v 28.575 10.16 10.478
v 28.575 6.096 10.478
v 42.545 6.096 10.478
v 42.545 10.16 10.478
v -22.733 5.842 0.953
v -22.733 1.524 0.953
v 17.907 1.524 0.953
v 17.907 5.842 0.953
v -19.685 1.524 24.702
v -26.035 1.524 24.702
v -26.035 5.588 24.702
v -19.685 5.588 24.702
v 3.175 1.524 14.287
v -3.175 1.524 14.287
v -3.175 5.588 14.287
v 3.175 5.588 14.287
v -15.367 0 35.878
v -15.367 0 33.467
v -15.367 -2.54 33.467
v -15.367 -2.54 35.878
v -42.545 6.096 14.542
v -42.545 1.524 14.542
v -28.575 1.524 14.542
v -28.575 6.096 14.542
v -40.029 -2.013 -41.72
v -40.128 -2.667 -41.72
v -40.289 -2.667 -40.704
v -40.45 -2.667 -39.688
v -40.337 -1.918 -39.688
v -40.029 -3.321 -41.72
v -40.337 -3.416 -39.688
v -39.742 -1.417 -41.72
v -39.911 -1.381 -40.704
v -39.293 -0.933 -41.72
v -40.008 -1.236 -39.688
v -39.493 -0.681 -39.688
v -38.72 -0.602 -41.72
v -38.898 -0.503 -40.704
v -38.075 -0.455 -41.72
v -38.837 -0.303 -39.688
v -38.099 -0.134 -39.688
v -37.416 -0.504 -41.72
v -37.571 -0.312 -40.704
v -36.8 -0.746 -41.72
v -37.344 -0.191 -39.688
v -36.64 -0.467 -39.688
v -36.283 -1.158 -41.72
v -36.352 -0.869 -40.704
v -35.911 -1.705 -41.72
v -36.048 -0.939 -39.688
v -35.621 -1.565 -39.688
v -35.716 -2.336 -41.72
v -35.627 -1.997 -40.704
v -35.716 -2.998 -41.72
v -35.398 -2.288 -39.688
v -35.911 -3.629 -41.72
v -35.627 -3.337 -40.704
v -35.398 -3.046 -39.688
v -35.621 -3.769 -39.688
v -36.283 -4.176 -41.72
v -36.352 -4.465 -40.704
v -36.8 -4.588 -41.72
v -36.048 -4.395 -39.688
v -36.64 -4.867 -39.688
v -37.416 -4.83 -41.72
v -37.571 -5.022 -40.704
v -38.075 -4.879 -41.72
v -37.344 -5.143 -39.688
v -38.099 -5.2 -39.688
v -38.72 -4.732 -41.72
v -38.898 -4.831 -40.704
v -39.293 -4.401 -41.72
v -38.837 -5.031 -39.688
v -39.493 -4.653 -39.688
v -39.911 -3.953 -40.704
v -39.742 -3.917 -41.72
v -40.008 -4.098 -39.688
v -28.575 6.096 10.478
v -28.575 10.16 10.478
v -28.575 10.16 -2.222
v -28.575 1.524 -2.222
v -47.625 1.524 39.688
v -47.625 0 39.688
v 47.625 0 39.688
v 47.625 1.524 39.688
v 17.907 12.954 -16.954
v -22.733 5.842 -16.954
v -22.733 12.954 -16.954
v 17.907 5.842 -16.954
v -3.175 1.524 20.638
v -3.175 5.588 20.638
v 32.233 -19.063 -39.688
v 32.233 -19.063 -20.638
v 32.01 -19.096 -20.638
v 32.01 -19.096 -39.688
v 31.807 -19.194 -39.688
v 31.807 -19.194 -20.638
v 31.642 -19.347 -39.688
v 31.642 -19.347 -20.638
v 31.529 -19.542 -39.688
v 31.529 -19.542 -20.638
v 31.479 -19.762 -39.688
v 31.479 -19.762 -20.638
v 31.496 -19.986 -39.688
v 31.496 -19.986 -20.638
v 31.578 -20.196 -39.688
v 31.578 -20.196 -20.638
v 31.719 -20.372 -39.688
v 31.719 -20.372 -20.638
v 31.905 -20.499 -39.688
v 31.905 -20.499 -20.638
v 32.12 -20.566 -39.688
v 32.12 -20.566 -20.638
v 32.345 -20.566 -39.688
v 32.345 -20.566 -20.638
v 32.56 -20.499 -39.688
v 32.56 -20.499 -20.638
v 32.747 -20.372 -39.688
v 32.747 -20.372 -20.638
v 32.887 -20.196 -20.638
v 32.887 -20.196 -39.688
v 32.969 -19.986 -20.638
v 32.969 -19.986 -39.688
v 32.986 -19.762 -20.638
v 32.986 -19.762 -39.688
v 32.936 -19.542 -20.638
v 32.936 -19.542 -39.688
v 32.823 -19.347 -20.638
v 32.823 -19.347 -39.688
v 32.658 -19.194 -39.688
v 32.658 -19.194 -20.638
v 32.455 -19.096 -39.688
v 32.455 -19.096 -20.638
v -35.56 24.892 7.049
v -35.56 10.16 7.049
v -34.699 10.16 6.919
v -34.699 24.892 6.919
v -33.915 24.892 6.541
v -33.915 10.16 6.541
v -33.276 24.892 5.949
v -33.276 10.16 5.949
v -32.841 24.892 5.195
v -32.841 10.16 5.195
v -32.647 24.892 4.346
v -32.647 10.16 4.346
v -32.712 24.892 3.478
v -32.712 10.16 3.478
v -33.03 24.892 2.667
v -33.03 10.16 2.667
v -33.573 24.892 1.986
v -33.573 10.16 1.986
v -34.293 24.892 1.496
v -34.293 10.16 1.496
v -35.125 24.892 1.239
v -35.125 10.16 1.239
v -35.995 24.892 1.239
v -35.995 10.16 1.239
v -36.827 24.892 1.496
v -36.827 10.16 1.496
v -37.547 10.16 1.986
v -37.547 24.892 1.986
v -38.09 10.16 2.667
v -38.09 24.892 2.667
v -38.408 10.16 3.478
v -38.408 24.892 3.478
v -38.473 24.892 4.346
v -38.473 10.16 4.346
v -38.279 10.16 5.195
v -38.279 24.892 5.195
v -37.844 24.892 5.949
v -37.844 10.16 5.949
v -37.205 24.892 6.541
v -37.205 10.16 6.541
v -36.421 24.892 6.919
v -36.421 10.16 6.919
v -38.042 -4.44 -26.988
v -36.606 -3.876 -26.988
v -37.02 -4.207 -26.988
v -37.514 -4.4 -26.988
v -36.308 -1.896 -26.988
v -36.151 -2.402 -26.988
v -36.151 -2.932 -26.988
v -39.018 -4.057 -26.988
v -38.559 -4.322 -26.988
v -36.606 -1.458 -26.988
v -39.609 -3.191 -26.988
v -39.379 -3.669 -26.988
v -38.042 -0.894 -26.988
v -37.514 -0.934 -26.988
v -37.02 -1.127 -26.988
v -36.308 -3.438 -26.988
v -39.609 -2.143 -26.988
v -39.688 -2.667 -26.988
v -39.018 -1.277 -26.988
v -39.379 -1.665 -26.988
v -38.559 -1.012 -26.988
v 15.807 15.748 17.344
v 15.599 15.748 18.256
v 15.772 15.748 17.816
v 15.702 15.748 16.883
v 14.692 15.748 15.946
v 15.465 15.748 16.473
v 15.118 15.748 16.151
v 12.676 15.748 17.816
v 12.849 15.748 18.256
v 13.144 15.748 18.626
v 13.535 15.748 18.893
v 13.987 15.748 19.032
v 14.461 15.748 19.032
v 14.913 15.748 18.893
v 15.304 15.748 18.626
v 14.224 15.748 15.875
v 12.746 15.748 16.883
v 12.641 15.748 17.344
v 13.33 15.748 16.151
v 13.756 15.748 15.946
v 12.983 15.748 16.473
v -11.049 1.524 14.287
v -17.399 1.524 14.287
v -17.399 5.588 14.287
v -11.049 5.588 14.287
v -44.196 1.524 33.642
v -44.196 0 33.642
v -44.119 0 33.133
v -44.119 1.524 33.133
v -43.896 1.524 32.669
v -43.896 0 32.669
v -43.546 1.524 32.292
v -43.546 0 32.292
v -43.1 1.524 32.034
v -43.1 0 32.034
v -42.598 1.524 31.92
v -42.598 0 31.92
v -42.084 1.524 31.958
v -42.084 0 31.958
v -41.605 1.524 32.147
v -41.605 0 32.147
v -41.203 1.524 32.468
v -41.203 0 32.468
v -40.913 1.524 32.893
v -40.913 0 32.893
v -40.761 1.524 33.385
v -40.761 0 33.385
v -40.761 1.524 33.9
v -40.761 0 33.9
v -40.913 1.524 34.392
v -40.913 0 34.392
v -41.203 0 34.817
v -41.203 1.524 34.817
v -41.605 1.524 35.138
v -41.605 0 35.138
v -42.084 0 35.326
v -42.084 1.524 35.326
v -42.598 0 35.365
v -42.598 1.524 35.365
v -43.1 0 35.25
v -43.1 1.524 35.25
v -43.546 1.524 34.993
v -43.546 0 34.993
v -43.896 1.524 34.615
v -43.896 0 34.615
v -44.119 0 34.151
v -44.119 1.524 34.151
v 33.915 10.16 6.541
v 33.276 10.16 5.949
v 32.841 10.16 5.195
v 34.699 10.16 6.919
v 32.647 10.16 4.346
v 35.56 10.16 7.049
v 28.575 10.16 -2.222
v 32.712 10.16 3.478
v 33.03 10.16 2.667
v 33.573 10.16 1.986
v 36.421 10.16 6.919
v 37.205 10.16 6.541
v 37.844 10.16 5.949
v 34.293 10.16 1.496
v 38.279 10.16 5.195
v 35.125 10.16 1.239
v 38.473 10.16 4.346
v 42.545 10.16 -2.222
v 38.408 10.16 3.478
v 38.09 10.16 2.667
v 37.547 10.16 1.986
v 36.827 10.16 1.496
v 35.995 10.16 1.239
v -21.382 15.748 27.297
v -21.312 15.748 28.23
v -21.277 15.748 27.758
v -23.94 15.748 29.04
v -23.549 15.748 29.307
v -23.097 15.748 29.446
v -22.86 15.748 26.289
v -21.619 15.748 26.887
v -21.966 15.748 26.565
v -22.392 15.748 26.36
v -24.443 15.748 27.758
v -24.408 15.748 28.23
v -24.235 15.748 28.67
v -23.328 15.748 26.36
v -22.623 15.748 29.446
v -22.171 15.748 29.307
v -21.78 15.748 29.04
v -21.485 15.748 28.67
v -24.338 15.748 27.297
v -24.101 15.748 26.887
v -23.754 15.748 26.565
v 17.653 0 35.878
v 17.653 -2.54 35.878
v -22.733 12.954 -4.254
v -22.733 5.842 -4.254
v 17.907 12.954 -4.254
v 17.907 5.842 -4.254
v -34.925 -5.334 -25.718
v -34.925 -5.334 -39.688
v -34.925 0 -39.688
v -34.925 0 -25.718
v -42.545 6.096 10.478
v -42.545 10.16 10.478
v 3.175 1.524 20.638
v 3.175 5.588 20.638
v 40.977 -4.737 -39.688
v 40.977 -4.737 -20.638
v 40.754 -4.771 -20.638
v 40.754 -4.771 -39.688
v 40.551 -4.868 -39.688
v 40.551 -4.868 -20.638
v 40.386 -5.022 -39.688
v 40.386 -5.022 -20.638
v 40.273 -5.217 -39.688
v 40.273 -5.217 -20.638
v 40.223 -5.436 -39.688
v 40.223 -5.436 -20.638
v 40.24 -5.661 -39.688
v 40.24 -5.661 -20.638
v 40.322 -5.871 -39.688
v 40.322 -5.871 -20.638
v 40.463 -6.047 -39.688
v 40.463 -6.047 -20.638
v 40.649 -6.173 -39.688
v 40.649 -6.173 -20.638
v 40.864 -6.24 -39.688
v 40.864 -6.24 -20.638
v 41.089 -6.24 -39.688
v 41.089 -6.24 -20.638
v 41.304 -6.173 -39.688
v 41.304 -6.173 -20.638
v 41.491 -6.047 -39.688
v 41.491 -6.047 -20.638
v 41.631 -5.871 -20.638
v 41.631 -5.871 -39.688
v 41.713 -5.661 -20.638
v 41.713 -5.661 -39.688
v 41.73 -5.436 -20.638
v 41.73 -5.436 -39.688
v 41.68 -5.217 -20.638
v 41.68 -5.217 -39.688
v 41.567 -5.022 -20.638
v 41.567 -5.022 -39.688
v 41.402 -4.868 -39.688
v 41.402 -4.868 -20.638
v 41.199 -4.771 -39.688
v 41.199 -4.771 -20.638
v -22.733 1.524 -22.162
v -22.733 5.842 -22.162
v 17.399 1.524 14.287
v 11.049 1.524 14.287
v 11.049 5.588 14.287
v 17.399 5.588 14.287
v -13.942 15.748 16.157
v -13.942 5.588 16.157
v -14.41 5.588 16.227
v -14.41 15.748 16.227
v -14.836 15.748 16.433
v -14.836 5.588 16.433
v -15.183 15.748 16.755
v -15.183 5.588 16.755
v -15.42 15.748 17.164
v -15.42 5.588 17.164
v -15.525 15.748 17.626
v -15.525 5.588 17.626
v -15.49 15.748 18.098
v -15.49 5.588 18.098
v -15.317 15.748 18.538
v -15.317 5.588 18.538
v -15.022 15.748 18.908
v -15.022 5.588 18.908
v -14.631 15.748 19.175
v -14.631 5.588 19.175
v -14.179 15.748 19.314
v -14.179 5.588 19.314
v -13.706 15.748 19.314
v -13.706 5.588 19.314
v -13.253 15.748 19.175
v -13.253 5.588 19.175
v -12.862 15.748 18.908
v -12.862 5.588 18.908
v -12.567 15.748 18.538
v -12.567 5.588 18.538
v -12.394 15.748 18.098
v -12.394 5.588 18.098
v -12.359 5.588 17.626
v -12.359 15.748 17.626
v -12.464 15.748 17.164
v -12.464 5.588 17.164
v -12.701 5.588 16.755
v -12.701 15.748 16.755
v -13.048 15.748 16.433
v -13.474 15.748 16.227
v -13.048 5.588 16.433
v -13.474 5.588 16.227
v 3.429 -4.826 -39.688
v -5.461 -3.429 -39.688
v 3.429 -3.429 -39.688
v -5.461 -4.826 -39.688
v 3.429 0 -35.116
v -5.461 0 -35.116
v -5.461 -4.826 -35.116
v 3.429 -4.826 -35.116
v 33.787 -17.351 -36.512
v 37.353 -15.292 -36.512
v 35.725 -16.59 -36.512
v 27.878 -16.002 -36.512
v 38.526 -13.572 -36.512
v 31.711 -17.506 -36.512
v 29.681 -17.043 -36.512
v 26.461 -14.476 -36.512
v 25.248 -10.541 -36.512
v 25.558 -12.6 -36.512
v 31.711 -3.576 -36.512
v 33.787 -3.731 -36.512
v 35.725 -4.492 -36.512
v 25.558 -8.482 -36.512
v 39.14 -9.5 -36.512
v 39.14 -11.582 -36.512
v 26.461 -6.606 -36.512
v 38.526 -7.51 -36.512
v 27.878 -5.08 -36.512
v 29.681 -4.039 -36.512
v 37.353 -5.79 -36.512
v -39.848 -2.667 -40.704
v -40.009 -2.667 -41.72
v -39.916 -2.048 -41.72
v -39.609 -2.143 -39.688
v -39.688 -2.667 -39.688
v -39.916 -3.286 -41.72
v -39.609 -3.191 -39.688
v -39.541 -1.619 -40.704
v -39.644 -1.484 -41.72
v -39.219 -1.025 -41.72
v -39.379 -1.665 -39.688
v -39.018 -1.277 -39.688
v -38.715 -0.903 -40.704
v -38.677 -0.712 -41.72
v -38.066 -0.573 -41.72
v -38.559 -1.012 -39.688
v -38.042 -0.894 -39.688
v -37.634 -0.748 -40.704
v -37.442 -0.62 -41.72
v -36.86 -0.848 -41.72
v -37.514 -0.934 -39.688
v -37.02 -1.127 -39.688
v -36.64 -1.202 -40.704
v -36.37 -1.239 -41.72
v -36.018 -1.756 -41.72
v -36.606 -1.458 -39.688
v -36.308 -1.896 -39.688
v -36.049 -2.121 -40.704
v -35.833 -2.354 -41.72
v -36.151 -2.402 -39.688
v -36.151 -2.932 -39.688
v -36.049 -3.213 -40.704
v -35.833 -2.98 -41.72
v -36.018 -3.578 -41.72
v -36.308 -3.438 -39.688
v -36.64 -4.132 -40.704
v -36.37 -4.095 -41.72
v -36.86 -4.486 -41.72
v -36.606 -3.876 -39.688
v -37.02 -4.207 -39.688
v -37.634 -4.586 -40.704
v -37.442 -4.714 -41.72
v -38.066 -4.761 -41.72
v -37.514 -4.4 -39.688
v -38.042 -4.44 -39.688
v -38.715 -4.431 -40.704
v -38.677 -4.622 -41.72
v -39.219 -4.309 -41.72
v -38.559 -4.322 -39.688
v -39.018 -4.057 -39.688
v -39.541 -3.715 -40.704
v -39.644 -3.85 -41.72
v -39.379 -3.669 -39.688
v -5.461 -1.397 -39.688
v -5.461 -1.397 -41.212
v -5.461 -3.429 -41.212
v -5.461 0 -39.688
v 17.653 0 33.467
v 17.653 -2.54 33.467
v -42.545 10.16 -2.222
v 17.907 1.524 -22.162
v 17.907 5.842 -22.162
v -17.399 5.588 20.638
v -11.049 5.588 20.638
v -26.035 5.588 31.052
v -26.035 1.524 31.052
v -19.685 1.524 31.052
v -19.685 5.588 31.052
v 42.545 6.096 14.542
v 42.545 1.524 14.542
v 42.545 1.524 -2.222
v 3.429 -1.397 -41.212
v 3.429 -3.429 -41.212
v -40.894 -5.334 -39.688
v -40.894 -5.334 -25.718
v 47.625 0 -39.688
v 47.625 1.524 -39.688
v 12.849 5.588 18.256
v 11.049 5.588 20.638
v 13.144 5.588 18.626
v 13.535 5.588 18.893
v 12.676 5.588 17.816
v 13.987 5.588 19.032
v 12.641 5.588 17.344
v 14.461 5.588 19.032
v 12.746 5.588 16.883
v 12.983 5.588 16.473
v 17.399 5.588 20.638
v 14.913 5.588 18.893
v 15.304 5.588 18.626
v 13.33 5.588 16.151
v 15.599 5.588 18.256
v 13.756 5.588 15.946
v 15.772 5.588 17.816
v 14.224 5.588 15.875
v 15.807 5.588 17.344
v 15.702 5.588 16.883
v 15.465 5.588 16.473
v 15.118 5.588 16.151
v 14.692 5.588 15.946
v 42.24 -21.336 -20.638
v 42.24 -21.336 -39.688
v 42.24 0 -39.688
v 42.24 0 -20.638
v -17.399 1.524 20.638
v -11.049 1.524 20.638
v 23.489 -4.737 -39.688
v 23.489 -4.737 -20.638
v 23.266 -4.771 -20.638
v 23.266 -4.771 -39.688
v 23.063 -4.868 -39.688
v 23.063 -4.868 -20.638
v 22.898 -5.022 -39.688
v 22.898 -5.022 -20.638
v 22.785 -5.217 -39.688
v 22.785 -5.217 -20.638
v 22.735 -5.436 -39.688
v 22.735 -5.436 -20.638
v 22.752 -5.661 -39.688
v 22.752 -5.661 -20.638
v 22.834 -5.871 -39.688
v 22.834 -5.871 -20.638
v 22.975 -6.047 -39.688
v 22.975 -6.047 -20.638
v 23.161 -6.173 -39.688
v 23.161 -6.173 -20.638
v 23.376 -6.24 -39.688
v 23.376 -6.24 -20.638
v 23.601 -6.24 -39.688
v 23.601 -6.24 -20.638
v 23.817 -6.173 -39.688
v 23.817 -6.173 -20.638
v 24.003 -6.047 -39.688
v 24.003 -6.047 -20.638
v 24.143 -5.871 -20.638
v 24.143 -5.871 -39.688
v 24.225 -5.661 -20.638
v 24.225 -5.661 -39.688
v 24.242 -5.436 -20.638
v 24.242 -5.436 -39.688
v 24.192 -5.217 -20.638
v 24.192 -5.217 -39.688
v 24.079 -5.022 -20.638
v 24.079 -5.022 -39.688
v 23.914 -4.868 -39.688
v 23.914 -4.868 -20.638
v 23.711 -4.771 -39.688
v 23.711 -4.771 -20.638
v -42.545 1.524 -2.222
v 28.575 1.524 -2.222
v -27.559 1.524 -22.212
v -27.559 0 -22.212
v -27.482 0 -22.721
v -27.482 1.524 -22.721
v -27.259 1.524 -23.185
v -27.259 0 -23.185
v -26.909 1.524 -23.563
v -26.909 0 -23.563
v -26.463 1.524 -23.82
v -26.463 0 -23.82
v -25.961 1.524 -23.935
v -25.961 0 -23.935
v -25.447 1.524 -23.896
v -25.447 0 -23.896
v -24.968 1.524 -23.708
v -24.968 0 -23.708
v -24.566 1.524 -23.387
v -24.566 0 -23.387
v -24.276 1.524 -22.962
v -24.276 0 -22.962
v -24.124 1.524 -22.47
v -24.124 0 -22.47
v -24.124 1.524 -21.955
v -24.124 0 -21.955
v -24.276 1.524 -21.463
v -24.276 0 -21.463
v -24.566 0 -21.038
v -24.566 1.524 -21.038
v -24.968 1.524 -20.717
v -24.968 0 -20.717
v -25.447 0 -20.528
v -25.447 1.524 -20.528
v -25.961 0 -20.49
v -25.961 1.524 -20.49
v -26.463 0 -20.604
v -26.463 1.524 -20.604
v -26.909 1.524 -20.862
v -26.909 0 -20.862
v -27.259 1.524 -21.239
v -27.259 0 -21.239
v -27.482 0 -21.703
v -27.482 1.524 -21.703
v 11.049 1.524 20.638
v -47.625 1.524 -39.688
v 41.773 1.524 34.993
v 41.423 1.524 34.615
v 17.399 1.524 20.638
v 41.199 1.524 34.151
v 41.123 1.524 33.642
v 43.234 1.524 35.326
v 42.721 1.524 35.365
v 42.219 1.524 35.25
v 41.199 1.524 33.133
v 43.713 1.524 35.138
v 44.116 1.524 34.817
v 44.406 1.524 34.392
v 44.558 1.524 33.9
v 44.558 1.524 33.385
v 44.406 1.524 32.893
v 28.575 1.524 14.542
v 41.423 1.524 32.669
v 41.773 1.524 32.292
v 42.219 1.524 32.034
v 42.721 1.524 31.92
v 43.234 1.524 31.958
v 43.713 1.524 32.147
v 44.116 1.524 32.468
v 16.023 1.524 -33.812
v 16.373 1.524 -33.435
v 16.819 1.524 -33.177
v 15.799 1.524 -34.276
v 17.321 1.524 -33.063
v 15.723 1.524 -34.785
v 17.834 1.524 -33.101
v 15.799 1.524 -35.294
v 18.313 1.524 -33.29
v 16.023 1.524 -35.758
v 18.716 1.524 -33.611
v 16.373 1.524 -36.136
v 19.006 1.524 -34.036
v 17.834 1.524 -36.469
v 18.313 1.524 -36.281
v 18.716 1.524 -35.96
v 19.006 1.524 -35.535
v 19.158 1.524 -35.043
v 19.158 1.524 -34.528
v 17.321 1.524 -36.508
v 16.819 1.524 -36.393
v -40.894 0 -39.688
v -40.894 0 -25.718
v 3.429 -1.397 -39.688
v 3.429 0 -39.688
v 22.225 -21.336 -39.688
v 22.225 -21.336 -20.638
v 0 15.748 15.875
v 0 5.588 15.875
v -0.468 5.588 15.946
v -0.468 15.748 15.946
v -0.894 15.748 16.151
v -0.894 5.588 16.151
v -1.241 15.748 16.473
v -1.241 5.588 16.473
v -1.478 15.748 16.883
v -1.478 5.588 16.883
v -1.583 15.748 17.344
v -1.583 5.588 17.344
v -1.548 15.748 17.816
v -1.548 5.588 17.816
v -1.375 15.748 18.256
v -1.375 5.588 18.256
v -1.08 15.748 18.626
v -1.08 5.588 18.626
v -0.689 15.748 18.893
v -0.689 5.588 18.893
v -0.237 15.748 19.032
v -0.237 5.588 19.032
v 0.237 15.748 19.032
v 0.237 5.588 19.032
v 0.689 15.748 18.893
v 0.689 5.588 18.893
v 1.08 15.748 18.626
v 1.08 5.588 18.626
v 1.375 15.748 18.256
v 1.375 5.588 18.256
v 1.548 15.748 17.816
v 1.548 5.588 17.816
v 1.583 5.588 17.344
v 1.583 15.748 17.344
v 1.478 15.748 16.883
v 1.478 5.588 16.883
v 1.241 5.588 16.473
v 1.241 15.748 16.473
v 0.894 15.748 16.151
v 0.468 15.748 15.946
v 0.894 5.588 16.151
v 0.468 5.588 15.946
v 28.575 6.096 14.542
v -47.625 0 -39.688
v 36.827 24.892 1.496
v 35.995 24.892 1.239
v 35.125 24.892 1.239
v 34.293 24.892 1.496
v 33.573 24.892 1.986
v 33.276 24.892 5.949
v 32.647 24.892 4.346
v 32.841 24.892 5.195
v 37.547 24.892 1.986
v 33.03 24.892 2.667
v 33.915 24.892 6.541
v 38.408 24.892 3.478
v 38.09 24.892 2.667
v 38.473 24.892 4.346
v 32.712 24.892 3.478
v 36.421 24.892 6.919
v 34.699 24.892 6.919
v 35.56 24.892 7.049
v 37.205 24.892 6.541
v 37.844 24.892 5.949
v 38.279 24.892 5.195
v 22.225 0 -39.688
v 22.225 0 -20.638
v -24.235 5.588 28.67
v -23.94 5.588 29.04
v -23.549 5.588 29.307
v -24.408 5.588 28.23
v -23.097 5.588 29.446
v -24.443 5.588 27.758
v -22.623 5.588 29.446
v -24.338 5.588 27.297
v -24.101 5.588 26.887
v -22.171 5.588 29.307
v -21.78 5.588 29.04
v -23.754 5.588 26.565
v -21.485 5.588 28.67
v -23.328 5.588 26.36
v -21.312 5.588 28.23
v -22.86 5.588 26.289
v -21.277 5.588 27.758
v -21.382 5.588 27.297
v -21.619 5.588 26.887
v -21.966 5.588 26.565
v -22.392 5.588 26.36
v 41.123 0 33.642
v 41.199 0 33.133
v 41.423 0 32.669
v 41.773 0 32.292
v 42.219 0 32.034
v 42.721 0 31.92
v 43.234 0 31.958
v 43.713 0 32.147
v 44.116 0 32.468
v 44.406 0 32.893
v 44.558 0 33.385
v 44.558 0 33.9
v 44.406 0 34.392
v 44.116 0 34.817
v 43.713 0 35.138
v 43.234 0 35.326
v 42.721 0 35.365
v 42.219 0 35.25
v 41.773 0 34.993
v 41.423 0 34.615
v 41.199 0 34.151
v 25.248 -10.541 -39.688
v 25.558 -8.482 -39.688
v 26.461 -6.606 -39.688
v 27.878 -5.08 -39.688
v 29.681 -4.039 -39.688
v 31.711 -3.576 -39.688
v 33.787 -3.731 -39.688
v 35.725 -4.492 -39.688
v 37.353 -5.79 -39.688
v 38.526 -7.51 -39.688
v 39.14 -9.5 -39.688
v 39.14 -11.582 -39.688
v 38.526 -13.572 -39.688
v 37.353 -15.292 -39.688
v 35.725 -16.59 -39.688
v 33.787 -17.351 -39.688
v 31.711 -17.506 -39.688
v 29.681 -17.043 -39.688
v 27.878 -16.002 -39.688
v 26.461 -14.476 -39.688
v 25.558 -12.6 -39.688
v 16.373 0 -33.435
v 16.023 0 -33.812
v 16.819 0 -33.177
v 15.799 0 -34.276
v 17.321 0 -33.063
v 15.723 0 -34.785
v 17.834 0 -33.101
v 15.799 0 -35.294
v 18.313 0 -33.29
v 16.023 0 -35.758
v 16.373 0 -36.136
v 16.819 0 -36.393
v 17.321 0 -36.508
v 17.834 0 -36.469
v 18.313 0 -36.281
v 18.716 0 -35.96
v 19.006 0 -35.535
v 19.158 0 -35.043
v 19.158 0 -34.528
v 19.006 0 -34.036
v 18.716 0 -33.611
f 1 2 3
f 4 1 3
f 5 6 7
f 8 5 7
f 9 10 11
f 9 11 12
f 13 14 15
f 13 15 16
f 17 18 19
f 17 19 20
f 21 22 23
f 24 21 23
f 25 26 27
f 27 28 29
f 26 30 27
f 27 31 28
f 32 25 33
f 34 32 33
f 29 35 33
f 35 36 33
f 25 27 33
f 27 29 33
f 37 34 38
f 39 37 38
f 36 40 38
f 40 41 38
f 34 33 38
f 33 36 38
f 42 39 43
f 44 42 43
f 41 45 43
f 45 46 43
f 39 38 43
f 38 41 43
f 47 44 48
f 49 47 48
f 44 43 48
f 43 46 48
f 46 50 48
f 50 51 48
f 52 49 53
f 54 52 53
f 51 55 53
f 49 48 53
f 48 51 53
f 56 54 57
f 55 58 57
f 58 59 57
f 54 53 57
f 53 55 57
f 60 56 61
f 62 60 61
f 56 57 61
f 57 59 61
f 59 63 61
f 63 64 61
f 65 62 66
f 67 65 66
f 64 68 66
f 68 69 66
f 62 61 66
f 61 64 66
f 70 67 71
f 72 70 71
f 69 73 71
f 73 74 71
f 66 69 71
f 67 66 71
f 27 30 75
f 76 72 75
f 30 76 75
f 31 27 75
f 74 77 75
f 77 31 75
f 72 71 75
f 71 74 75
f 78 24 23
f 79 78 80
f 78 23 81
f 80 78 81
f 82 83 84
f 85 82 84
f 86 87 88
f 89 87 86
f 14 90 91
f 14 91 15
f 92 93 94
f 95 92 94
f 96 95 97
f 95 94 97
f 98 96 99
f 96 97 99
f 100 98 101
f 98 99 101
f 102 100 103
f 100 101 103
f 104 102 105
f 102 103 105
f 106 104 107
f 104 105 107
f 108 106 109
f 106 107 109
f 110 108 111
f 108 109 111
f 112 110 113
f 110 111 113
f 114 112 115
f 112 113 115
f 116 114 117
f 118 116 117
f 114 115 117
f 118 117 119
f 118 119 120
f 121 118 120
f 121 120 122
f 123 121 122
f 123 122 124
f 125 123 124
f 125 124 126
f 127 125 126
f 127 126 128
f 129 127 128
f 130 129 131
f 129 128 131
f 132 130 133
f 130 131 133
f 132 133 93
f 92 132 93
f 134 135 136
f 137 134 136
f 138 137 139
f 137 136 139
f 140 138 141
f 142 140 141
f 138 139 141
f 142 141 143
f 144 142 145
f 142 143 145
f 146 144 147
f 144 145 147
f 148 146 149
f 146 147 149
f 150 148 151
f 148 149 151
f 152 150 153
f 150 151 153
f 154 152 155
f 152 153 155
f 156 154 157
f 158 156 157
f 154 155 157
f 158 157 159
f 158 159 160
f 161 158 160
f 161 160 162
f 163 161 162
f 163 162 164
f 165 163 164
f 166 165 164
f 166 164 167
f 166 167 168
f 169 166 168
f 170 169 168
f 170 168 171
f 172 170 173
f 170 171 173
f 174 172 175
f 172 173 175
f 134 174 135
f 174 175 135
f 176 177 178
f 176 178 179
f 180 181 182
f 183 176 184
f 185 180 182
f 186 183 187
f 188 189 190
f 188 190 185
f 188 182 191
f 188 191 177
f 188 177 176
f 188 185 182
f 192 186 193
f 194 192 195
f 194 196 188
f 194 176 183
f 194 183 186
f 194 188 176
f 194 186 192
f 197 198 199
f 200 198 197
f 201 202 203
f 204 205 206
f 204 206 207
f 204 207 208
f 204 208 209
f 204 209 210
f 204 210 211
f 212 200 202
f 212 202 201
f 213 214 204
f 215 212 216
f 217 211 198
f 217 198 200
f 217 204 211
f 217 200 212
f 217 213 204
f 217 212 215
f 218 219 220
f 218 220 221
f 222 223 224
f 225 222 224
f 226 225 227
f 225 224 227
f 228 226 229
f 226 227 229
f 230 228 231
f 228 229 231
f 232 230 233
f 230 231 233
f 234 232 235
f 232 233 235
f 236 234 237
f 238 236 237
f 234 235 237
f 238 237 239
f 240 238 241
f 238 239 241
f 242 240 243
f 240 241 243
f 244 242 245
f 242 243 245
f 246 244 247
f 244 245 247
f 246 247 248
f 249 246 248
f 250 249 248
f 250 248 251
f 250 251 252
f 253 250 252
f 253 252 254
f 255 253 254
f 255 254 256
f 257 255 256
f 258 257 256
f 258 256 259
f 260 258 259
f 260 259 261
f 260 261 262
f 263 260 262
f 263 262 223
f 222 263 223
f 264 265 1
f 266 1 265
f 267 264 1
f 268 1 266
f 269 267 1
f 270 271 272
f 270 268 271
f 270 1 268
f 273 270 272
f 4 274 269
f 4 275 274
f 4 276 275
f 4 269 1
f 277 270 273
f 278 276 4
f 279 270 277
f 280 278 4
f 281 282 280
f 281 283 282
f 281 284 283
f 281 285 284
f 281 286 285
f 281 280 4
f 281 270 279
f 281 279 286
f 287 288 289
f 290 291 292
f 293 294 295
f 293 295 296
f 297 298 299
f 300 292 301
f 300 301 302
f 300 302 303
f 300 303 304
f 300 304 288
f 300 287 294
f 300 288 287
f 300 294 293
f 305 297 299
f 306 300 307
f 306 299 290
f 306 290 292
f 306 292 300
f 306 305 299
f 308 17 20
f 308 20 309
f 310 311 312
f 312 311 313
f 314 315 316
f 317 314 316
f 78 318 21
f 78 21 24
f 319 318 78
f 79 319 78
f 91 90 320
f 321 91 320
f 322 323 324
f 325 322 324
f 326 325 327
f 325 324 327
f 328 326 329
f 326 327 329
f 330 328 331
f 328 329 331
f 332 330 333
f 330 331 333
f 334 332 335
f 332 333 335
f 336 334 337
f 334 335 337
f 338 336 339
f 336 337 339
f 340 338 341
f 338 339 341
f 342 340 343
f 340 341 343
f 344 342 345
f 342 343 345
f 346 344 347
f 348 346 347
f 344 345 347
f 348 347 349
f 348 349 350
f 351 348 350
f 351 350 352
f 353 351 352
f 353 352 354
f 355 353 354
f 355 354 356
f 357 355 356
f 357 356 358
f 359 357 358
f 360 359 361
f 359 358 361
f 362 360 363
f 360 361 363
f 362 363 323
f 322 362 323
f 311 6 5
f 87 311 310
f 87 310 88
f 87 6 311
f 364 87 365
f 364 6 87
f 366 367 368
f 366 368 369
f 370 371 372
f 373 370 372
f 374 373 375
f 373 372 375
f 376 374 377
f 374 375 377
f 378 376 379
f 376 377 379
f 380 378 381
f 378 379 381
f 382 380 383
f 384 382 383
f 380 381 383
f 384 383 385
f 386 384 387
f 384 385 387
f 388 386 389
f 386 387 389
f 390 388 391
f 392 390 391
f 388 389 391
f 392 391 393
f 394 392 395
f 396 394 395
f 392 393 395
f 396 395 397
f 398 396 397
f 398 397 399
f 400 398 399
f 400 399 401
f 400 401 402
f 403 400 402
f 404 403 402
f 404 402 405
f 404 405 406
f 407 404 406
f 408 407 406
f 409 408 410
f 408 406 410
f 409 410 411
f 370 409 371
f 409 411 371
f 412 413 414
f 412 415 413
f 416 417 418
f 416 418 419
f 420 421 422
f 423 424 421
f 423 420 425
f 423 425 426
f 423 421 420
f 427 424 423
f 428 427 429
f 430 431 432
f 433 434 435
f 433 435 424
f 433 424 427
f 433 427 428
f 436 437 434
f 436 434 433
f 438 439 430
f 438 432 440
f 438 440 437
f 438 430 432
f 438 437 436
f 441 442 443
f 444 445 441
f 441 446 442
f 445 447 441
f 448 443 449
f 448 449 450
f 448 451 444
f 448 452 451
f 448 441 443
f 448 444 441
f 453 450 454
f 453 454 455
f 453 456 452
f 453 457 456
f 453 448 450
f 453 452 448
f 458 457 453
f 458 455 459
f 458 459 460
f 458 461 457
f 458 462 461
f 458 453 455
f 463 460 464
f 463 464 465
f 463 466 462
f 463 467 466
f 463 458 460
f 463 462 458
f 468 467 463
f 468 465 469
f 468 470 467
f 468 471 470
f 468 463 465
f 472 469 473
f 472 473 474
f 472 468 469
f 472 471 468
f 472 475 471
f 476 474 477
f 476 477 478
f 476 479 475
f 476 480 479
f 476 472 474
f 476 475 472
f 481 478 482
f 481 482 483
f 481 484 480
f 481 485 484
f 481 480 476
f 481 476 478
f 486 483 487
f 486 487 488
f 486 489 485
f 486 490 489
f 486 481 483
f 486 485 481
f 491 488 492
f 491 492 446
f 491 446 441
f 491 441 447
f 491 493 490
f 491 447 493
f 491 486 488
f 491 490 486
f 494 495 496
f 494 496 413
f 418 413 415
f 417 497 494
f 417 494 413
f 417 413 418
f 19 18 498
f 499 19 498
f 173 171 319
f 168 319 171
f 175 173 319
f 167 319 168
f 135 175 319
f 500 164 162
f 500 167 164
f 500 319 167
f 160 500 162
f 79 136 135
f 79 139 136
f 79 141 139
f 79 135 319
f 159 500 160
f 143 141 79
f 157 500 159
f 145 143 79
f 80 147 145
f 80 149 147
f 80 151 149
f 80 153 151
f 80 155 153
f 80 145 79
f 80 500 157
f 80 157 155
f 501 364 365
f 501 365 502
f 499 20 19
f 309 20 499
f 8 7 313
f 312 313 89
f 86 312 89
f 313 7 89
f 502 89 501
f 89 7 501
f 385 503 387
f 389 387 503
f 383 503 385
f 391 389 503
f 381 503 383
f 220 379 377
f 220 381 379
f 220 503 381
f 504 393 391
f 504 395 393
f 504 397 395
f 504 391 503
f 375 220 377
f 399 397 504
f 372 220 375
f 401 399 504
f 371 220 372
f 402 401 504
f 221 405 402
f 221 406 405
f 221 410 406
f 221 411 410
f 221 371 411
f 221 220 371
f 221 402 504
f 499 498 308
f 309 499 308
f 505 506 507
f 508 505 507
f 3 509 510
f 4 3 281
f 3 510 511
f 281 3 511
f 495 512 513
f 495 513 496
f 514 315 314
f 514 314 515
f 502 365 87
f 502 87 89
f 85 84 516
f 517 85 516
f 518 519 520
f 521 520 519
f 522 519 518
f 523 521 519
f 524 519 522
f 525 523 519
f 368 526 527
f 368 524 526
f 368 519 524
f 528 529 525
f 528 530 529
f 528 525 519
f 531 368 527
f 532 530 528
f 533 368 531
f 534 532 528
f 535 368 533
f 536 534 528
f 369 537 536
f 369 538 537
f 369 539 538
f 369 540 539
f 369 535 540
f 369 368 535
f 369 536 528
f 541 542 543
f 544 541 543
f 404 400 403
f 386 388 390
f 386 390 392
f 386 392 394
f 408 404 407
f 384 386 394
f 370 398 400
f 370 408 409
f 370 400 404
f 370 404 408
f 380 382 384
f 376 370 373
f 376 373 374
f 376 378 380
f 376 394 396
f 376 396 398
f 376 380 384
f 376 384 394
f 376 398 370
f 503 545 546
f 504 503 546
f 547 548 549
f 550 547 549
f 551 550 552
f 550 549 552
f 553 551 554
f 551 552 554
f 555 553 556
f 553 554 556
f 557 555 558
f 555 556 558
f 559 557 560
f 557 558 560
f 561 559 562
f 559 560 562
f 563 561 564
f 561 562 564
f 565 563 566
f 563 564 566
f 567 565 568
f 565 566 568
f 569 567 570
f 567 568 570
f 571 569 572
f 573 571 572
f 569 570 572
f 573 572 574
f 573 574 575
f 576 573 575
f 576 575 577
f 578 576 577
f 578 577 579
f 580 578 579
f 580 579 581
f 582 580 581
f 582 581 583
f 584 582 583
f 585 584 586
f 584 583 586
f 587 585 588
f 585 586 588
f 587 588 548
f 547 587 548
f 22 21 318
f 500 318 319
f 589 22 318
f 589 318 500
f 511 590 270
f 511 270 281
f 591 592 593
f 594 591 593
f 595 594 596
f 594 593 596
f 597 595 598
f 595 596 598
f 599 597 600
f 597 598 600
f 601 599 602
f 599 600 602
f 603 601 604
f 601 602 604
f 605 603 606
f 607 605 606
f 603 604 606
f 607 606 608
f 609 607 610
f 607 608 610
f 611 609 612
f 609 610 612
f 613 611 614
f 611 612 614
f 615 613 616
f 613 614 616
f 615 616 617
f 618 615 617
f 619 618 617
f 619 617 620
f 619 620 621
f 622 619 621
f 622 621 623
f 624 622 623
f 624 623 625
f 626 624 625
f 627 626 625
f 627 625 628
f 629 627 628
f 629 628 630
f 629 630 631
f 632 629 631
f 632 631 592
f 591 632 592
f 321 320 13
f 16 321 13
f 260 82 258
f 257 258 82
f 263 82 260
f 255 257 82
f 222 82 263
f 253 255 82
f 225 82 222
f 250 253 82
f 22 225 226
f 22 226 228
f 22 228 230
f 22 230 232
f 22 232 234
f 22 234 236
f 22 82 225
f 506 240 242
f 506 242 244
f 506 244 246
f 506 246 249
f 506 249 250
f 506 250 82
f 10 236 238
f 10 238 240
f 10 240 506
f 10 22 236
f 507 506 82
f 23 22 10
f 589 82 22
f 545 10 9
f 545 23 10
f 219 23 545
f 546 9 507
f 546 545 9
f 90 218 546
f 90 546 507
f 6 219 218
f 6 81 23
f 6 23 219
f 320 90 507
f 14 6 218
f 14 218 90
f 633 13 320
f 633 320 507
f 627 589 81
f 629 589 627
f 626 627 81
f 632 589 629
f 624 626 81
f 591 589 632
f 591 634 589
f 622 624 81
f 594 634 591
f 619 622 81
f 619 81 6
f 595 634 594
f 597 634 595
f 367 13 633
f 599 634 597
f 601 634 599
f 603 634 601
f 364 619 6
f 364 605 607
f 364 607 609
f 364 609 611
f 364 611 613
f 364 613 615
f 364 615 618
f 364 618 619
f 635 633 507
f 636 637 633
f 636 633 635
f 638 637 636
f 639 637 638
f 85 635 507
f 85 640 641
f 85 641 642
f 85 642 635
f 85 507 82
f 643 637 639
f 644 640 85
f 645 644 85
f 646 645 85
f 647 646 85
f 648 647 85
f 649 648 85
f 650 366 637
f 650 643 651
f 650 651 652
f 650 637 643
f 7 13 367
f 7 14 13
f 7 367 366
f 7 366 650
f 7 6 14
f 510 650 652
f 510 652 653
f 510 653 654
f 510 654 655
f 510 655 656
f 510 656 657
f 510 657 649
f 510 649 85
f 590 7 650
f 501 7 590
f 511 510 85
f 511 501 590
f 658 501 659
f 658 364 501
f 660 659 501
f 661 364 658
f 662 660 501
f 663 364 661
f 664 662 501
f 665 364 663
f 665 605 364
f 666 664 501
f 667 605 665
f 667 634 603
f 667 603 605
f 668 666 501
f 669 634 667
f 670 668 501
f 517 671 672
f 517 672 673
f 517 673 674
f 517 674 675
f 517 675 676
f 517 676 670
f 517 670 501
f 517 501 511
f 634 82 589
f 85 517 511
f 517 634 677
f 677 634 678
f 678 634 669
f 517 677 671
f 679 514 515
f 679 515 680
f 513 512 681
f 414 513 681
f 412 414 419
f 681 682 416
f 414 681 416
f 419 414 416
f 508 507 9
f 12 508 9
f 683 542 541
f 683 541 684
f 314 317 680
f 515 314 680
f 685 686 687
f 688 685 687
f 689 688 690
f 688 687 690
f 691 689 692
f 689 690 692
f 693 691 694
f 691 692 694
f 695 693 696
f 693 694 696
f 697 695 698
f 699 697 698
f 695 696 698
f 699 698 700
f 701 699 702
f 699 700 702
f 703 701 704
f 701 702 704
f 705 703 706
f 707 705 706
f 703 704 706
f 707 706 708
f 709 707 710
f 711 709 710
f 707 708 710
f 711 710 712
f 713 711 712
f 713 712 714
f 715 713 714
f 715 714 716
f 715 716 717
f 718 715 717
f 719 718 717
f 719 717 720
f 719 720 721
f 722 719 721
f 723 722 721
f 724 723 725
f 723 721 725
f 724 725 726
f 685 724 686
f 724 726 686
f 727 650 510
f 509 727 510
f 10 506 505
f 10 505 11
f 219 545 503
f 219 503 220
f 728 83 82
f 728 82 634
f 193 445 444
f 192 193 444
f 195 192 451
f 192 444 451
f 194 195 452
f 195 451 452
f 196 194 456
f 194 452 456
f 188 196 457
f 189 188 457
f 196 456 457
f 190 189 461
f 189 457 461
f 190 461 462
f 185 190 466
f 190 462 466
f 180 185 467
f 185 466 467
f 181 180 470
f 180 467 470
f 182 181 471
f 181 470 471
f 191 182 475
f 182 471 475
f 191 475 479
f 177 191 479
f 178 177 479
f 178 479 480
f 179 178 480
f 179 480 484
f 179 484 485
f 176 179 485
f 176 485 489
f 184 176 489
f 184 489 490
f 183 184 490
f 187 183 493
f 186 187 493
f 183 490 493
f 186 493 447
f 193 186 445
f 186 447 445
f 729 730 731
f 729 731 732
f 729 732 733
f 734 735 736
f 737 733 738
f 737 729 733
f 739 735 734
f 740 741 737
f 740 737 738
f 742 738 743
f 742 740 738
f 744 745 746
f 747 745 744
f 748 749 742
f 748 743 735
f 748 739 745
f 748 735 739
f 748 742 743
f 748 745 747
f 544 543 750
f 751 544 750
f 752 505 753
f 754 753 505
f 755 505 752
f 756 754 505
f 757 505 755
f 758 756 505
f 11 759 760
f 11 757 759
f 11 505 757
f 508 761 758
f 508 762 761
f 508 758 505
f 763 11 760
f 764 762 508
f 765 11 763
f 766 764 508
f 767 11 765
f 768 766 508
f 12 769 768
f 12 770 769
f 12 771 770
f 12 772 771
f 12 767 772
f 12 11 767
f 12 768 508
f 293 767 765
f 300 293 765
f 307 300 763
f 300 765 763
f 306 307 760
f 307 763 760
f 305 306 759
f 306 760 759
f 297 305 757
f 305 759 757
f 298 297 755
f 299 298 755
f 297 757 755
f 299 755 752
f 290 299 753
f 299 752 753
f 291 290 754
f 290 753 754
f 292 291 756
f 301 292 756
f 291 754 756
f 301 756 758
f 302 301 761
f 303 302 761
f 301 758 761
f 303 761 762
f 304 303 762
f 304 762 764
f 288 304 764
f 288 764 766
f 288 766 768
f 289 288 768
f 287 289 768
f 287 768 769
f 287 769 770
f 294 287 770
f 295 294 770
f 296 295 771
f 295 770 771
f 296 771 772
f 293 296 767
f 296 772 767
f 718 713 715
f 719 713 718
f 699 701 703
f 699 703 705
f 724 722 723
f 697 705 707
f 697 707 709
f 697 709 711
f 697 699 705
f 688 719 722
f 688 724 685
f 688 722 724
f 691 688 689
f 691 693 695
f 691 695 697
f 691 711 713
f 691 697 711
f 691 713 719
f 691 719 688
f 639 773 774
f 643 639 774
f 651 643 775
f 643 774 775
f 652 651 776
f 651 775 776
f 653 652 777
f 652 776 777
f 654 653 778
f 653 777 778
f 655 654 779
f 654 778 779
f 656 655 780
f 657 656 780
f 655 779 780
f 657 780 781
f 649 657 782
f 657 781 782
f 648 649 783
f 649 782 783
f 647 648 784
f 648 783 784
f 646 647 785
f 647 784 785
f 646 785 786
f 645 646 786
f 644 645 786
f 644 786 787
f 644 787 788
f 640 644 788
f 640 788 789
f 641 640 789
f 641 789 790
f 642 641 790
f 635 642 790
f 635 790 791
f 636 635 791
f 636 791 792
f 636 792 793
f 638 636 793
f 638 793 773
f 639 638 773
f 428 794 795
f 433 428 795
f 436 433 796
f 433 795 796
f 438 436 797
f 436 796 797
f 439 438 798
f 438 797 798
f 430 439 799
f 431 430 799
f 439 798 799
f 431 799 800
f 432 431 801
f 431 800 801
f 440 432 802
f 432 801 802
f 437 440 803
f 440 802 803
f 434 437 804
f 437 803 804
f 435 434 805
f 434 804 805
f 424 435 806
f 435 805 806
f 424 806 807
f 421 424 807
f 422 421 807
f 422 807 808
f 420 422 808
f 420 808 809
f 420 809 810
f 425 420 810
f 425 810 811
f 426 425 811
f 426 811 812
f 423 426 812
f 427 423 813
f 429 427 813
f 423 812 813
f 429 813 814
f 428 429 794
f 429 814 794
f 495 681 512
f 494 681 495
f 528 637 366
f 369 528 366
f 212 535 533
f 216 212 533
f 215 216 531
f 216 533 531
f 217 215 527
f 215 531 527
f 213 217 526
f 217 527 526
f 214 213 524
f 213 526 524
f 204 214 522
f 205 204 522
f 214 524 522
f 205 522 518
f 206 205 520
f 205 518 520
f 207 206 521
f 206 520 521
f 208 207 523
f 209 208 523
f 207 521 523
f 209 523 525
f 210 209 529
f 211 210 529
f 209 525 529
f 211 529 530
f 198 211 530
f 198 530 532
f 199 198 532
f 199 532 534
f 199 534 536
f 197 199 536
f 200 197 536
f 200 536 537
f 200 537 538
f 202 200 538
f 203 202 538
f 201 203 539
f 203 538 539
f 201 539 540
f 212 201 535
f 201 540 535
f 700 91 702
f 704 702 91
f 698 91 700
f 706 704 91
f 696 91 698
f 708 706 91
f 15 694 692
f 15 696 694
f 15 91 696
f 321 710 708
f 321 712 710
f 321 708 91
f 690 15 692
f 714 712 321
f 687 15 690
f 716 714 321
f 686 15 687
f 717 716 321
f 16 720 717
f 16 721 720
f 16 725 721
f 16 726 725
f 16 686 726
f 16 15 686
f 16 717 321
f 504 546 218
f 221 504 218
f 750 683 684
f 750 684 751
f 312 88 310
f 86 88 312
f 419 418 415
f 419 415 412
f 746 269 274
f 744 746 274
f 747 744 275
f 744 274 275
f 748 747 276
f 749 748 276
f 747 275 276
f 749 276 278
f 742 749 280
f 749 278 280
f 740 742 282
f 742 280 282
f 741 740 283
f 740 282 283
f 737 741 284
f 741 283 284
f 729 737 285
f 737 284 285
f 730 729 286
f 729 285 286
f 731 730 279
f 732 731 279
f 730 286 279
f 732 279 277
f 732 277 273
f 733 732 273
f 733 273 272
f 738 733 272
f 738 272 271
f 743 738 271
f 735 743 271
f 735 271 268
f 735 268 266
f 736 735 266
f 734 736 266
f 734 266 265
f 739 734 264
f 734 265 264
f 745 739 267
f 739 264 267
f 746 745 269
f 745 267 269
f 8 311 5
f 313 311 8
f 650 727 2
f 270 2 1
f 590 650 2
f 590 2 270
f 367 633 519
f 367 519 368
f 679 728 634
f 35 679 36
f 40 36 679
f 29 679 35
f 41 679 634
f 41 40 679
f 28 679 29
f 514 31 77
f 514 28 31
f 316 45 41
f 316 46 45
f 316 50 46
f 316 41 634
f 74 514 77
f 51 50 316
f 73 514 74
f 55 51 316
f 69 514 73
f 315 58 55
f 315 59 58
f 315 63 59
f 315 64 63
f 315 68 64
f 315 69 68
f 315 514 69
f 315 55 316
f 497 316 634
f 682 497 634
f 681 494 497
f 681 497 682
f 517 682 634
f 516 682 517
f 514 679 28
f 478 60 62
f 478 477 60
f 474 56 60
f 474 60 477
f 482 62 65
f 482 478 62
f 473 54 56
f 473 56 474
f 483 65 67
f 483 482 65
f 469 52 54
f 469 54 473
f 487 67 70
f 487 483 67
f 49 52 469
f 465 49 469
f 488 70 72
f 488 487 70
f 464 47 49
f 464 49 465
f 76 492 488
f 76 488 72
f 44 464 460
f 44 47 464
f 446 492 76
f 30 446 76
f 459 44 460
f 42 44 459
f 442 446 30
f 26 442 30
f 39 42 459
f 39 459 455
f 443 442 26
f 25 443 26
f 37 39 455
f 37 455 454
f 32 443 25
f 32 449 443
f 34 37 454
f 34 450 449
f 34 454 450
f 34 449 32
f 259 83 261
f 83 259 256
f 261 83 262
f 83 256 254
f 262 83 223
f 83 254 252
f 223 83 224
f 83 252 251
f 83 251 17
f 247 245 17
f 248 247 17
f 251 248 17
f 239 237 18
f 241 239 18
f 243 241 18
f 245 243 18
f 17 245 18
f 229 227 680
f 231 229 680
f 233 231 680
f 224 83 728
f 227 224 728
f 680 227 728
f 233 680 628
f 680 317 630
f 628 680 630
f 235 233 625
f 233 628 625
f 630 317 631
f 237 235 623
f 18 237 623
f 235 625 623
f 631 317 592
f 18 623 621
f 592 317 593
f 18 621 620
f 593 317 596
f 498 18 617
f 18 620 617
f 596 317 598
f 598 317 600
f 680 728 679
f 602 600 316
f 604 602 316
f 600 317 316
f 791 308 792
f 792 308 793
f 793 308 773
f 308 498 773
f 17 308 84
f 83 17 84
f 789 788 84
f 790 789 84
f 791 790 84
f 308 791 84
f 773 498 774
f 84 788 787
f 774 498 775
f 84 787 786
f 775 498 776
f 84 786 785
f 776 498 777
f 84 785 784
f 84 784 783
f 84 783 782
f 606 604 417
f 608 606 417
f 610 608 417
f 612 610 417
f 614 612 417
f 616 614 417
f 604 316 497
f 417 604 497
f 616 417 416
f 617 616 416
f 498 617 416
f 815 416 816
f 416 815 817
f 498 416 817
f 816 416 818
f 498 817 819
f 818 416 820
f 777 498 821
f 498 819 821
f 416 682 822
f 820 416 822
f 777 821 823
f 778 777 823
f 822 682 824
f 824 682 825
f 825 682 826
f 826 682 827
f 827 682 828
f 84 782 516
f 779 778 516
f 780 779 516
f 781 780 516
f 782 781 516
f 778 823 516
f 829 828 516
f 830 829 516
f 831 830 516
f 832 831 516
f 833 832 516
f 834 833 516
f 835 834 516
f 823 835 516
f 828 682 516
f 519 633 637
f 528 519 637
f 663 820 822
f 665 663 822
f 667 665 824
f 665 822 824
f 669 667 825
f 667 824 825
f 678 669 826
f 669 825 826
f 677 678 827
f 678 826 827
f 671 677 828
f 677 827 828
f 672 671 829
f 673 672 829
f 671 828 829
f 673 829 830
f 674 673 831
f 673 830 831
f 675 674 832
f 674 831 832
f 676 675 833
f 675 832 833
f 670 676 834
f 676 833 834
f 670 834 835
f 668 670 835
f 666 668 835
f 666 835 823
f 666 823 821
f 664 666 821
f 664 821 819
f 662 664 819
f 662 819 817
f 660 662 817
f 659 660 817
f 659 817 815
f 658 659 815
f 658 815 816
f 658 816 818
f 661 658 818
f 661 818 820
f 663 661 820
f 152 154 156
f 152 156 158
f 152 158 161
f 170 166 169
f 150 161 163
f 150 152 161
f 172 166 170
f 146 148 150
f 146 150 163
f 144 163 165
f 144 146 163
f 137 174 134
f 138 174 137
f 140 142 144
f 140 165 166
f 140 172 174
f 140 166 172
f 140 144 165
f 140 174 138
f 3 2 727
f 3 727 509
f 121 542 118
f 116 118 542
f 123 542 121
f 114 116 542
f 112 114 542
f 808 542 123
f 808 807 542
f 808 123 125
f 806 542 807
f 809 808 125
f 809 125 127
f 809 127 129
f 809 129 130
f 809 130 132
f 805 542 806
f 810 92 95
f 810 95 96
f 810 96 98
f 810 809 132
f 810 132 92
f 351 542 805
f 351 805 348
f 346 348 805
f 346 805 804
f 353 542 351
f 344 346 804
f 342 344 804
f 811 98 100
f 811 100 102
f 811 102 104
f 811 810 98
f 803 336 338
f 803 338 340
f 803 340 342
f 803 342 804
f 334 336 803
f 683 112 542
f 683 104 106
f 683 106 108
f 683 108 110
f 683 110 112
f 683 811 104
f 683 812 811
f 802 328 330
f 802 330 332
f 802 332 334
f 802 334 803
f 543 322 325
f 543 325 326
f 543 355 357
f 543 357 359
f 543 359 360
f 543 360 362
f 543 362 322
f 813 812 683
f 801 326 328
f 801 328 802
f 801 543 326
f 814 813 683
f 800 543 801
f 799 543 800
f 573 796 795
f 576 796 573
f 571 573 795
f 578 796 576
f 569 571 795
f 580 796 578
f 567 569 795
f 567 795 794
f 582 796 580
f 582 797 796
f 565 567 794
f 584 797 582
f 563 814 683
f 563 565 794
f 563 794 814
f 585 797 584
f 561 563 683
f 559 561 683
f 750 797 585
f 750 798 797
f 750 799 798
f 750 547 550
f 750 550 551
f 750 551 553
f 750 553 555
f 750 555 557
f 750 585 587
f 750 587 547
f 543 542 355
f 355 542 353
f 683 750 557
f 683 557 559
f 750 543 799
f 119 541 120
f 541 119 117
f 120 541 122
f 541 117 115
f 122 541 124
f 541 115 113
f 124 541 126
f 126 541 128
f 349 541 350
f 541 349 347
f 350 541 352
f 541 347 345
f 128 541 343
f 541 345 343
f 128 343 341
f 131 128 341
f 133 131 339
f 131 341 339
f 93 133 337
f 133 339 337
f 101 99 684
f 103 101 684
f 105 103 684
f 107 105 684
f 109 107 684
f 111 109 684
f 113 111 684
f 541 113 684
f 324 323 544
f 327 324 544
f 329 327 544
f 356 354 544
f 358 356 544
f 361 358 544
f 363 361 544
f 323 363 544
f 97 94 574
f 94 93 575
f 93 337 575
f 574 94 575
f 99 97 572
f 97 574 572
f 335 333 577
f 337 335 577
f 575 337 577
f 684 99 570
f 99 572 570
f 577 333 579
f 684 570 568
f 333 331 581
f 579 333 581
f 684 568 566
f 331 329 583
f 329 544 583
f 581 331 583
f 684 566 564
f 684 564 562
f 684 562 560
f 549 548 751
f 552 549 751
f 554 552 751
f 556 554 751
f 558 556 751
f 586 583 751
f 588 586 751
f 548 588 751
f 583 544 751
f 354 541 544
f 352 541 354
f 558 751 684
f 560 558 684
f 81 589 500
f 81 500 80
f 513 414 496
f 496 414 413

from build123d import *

# Parameters (mm, degrees)
SKETCH1_W                             = 95.25
SKETCH1_H                             = 79.375
BOSS_EXTRUDE1_DEPTH                   = 1.524
F_29_0_136_DIAMETER_HOLE1_D           = 3.4544
SKETCH4_W                             = 13.97
SKETCH4_H                             = 16.764
BOSS_EXTRUDE2_DEPTH                   = 4.572
SKETCH5_W                             = 13.97
SKETCH5_H                             = 12.7
BOSS_EXTRUDE3_DEPTH                   = 4.064
SKETCH8_W                             = 6.35
SKETCH8_H                             = 6.35
BOSS_EXTRUDE5_DEPTH                   = 4.064
SKETCH9_R                             = 1.5875
BOSS_EXTRUDE6_DEPTH                   = 10.16
SKETCH10_R                            = 2.921
BOSS_EXTRUDE7_DEPTH                   = 14.732
SKETCH11_W                            = 20.0152
SKETCH11_H                            = 21.336
BOSS_EXTRUDE8_DEPTH                   = 19.05
SKETCH12_R                            = 6.985
CUT_EXTRUDE1_DEPTH                    = 3.175
SKETCH14_W                            = 0.75565
SKETCH14_H                            = 79.375
F_53_0_0595_DIAMETER_HOLE1_AT_2_COUNT = 2
F_53_0_0595_DIAMETER_HOLE1_AT_2_PITCH = 17.4879
F_53_0_0595_DIAMETER_HOLE1_AT_3_COUNT = 2
F_53_0_0595_DIAMETER_HOLE1_AT_3_PITCH = 16.783370835
SKETCH15_W                            = 5.969
SKETCH15_H                            = 5.334
BOSS_EXTRUDE9_DEPTH                   = 13.97
SKETCH16_R                            = 2.54
SKETCH16_R_2                          = 1.778
BOSS_EXTRUDE10_DEPTH                  = 2.032
BOSS_EXTRUDE10_DRAFT                  = 9
SKETCH17_R                            = 1.778
CUT_EXTRUDE2_DEPTH                    = 12.7
SKETCH18_W                            = 40.64
SKETCH18_H                            = 23.114
BOSS_EXTRUDE11_DEPTH                  = 4.318
SKETCH19_W                            = 40.64
SKETCH19_H                            = 12.7
BOSS_EXTRUDE12_DEPTH                  = 7.112
SKETCH20_W                            = 33.02
SKETCH20_H                            = 2.410000006
BOSS_EXTRUDE13_DEPTH                  = 2.54
SKETCH21_W                            = 8.89
SKETCH21_H                            = 4.572
BOSS_EXTRUDE14_DEPTH                  = 4.826
SKETCH22_W                            = 8.89
SKETCH22_H                            = 2.032
BOSS_EXTRUDE15_DEPTH                  = 1.524


with BuildPart() as part:
    # Sketch1 → Boss-Extrude1 (new body)
    with BuildSketch(Plane(origin=(0, 0, 0), x_dir=(1, 0, 0), z_dir=(0, 1, 0))):
        Rectangle(SKETCH1_W, SKETCH1_H)
    extrude(amount=BOSS_EXTRUDE1_DEPTH)

    # #29 (0.136) Diameter Hole1 (through all)
    with Locations(Plane(origin=(0, 1.524, 0), x_dir=(1, 0, 0), z_dir=(0, 1, 0))):
        with Locations((42.8498, -33.6423), (17.4498, 34.7853), (-25.8318, 22.2123), (-42.4688, -33.6423)):
            Hole(F_29_0_136_DIAMETER_HOLE1_D / 2)

    # Sketch4 → Boss-Extrude2 (add)
    with BuildSketch(Plane(origin=(0, 1.524, 0), x_dir=(1, 0, 0), z_dir=(0, 1, 0))):
        with Locations((35.56, -6.1595)):
            Rectangle(SKETCH4_W, SKETCH4_H)
        with Locations((-35.56, -6.1595)):
            Rectangle(SKETCH4_W, SKETCH4_H)
    extrude(amount=BOSS_EXTRUDE2_DEPTH)

    # Sketch5 → Boss-Extrude3 (add)
    with BuildSketch(Plane(origin=(0, 6.096, 0), x_dir=(1, 0, 0), z_dir=(0, 1, 0))):
        with Locations((-35.56, -4.1275)):
            Rectangle(SKETCH5_W, SKETCH5_H)
        with Locations((35.56, -4.1275)):
            Rectangle(SKETCH5_W, SKETCH5_H)
    extrude(amount=BOSS_EXTRUDE3_DEPTH)

    # Sketch8 → Boss-Extrude5 (add)
    with BuildSketch(Plane(origin=(0, 1.524, 0), x_dir=(1, 0, 0), z_dir=(0, 1, 0))):
        with Locations((-22.86, -27.8765)):
            Rectangle(SKETCH8_W, SKETCH8_H)
        with Locations((14.224, -17.4625)):
            Rectangle(SKETCH8_W, SKETCH8_H)
        with Locations((0, -17.4625)):
            Rectangle(SKETCH8_W, SKETCH8_H)
        with Locations((-14.224, -17.4625)):
            Rectangle(SKETCH8_W, SKETCH8_H)
    extrude(amount=BOSS_EXTRUDE5_DEPTH)

    # Sketch9 → Boss-Extrude6 (add)
    with BuildSketch(Plane(origin=(0, 5.588, 0), x_dir=(1, 0, 0), z_dir=(0, 1, 0))):
        with Locations(Location((-13.942192497, -17.744307503, 0), (0, 0, 90))):
            Circle(SKETCH9_R)
        with Locations(Location((0, -17.4625, 0), (0, 0, 90))):
            Circle(SKETCH9_R)
        with Locations(Location((14.224, -17.4625, 0), (0, 0, 90))):
            Circle(SKETCH9_R)
        with Locations(Location((-22.86, -27.8765, 0), (0, 0, 90))):
            Circle(SKETCH9_R)
    extrude(amount=BOSS_EXTRUDE6_DEPTH)

    # Sketch10 → Boss-Extrude7 (add)
    with BuildSketch(Plane(origin=(0, 10.16, 0), x_dir=(1, 0, 0), z_dir=(0, 1, 0))):
        with Locations(Location((-35.56, -4.1275, 0), (0, 0, 270))):
            Circle(SKETCH10_R)
        with Locations(Location((35.56, -4.1275, 0), (0, 0, 270))):
            Circle(SKETCH10_R)
    extrude(amount=BOSS_EXTRUDE7_DEPTH)

    # Sketch15 → Boss-Extrude9 (add)
    with BuildSketch(Plane(origin=(0, 0, -39.6875), x_dir=(-1, 0, 0), z_dir=(0, 0, -1))):
        with Locations((37.9095, -2.667)):
            Rectangle(SKETCH15_W, SKETCH15_H)
    extrude(amount=-BOSS_EXTRUDE9_DEPTH)


with BuildPart() as body_2:
    # Sketch11 → Boss-Extrude8 (new body)
    with BuildSketch(Plane(origin=(0, 0, -39.6875), x_dir=(-1, 0, 0), z_dir=(0, 0, -1))):
        with Locations((-32.2326, -10.668)):
            Rectangle(SKETCH11_W, SKETCH11_H)
    extrude(amount=-BOSS_EXTRUDE8_DEPTH)

    # Sketch12 → Cut-Extrude1 (cut)
    with BuildSketch(Plane(origin=(0, 0, -39.6875), x_dir=(-1, 0, 0), z_dir=(0, 0, -1))):
        with Locations((-32.2326, -10.541)):
            Circle(SKETCH12_R)
    extrude(amount=-CUT_EXTRUDE1_DEPTH, mode=Mode.SUBTRACT)

    # Sketch14 → #53 (0.0595) Diameter Hole1 (revolve, cut)
    with BuildSketch(Plane(origin=(40.97655, -5.492678114, -39.6875), x_dir=(0, 1, 0), z_dir=(1, 0, 0))):
        with Locations((0.377825, 39.6875)):
            Rectangle(SKETCH14_W, SKETCH14_H)
    f_53_0_0595_diameter_hole1 = revolve(axis=Axis((40.97655, -5.492678114, -46.0375), (0, 0, 1)), mode=Mode.SUBTRACT)

    # #53 (0.0595) Diameter Hole1 at 2: #53 (0.0595) Diameter Hole1 ×2
    with Locations(*[(-i * F_53_0_0595_DIAMETER_HOLE1_AT_2_PITCH, 0, 0) for i in range(1, F_53_0_0595_DIAMETER_HOLE1_AT_2_COUNT)]):
        add(f_53_0_0595_diameter_hole1, mode=Mode.SUBTRACT)

    # #53 (0.0595) Diameter Hole1 at 3: #53 (0.0595) Diameter Hole1 ×2
    with Locations(*[Vector(-0.5209889053752342, -0.8535634484184028, 0) * (i * F_53_0_0595_DIAMETER_HOLE1_AT_3_PITCH) for i in range(1, F_53_0_0595_DIAMETER_HOLE1_AT_3_COUNT)]):
        add(f_53_0_0595_diameter_hole1, mode=Mode.SUBTRACT)


with BuildPart() as boss_extrude10_tool:
    # Sketch16 → Boss-Extrude10 (with draft: the straight prism first)
    with BuildSketch(Plane(origin=(0, 0, -39.6875), x_dir=(-1, 0, 0), z_dir=(0, 0, -1))):
        with Locations((37.9095, -2.667)):
            Circle(SKETCH16_R)
        with Locations((37.9095, -2.667)):
            Circle(SKETCH16_R_2, mode=Mode.SUBTRACT)
    extrude(amount=BOSS_EXTRUDE10_DEPTH)
    # Boss-Extrude10: the draft: its side faces are tilted about the plane it starts from
    boss_extrude10_sides = [boss_extrude10_tool.faces().sort_by_distance(p)[0] for p in [
        (-35.3695, -2.667, -40.7035),
        (-36.1315, -2.667, -40.7035),
    ]]
    draft(boss_extrude10_sides, Plane(origin=(0, 0, -39.6875), x_dir=(-1, 0, 0), z_dir=(0, 0, -1)), BOSS_EXTRUDE10_DRAFT)


with BuildPart() as part_1:
    add(part.part)

    # Boss-Extrude10: add boss_extrude10_tool
    add(boss_extrude10_tool.part)

    # Sketch17 → Cut-Extrude2 (cut)
    with BuildSketch(Plane(origin=(0, 0, -39.6875), x_dir=(-1, 0, 0), z_dir=(0, 0, -1))):
        with Locations((37.9095, -2.667)):
            Circle(SKETCH17_R)
    extrude(amount=-CUT_EXTRUDE2_DEPTH, mode=Mode.SUBTRACT)

    # Sketch18 → Boss-Extrude11 (add)
    with BuildSketch(Plane(origin=(0, 1.524, 0), x_dir=(1, 0, 0), z_dir=(0, 1, 0))):
        with Locations((-2.413, 10.6045)):
            Rectangle(SKETCH18_W, SKETCH18_H)
    extrude(amount=BOSS_EXTRUDE11_DEPTH)

    # Sketch19 → Boss-Extrude12 (add)
    with BuildSketch(Plane(origin=(0, 5.842, 0), x_dir=(1, 0, 0), z_dir=(0, 1, 0))):
        with Locations((-2.413, 10.6045)):
            Rectangle(SKETCH19_W, SKETCH19_H)
    extrude(amount=BOSS_EXTRUDE12_DEPTH)

    # Sketch20 → Boss-Extrude13 (add)
    with BuildSketch(Plane.XZ):
        with Locations((1.143, 34.672499997)):
            Rectangle(SKETCH20_W, SKETCH20_H)
    extrude(amount=BOSS_EXTRUDE13_DEPTH)

    # Sketch21 → Boss-Extrude14 (add)
    with BuildSketch(Plane.XZ):
        with Locations((-1.016, -37.4015)):
            Rectangle(SKETCH21_W, SKETCH21_H)
    extrude(amount=BOSS_EXTRUDE14_DEPTH)

    # Sketch22 → Boss-Extrude15 (add)
    with BuildSketch(Plane(origin=(0, 0, -39.6875), x_dir=(-1, 0, 0), z_dir=(0, 0, -1))):
        with Locations((1.016, -2.413)):
            Rectangle(SKETCH22_W, SKETCH22_H)
    extrude(amount=BOSS_EXTRUDE15_DEPTH)


solid = Compound([body_2.part, part_1.part])
